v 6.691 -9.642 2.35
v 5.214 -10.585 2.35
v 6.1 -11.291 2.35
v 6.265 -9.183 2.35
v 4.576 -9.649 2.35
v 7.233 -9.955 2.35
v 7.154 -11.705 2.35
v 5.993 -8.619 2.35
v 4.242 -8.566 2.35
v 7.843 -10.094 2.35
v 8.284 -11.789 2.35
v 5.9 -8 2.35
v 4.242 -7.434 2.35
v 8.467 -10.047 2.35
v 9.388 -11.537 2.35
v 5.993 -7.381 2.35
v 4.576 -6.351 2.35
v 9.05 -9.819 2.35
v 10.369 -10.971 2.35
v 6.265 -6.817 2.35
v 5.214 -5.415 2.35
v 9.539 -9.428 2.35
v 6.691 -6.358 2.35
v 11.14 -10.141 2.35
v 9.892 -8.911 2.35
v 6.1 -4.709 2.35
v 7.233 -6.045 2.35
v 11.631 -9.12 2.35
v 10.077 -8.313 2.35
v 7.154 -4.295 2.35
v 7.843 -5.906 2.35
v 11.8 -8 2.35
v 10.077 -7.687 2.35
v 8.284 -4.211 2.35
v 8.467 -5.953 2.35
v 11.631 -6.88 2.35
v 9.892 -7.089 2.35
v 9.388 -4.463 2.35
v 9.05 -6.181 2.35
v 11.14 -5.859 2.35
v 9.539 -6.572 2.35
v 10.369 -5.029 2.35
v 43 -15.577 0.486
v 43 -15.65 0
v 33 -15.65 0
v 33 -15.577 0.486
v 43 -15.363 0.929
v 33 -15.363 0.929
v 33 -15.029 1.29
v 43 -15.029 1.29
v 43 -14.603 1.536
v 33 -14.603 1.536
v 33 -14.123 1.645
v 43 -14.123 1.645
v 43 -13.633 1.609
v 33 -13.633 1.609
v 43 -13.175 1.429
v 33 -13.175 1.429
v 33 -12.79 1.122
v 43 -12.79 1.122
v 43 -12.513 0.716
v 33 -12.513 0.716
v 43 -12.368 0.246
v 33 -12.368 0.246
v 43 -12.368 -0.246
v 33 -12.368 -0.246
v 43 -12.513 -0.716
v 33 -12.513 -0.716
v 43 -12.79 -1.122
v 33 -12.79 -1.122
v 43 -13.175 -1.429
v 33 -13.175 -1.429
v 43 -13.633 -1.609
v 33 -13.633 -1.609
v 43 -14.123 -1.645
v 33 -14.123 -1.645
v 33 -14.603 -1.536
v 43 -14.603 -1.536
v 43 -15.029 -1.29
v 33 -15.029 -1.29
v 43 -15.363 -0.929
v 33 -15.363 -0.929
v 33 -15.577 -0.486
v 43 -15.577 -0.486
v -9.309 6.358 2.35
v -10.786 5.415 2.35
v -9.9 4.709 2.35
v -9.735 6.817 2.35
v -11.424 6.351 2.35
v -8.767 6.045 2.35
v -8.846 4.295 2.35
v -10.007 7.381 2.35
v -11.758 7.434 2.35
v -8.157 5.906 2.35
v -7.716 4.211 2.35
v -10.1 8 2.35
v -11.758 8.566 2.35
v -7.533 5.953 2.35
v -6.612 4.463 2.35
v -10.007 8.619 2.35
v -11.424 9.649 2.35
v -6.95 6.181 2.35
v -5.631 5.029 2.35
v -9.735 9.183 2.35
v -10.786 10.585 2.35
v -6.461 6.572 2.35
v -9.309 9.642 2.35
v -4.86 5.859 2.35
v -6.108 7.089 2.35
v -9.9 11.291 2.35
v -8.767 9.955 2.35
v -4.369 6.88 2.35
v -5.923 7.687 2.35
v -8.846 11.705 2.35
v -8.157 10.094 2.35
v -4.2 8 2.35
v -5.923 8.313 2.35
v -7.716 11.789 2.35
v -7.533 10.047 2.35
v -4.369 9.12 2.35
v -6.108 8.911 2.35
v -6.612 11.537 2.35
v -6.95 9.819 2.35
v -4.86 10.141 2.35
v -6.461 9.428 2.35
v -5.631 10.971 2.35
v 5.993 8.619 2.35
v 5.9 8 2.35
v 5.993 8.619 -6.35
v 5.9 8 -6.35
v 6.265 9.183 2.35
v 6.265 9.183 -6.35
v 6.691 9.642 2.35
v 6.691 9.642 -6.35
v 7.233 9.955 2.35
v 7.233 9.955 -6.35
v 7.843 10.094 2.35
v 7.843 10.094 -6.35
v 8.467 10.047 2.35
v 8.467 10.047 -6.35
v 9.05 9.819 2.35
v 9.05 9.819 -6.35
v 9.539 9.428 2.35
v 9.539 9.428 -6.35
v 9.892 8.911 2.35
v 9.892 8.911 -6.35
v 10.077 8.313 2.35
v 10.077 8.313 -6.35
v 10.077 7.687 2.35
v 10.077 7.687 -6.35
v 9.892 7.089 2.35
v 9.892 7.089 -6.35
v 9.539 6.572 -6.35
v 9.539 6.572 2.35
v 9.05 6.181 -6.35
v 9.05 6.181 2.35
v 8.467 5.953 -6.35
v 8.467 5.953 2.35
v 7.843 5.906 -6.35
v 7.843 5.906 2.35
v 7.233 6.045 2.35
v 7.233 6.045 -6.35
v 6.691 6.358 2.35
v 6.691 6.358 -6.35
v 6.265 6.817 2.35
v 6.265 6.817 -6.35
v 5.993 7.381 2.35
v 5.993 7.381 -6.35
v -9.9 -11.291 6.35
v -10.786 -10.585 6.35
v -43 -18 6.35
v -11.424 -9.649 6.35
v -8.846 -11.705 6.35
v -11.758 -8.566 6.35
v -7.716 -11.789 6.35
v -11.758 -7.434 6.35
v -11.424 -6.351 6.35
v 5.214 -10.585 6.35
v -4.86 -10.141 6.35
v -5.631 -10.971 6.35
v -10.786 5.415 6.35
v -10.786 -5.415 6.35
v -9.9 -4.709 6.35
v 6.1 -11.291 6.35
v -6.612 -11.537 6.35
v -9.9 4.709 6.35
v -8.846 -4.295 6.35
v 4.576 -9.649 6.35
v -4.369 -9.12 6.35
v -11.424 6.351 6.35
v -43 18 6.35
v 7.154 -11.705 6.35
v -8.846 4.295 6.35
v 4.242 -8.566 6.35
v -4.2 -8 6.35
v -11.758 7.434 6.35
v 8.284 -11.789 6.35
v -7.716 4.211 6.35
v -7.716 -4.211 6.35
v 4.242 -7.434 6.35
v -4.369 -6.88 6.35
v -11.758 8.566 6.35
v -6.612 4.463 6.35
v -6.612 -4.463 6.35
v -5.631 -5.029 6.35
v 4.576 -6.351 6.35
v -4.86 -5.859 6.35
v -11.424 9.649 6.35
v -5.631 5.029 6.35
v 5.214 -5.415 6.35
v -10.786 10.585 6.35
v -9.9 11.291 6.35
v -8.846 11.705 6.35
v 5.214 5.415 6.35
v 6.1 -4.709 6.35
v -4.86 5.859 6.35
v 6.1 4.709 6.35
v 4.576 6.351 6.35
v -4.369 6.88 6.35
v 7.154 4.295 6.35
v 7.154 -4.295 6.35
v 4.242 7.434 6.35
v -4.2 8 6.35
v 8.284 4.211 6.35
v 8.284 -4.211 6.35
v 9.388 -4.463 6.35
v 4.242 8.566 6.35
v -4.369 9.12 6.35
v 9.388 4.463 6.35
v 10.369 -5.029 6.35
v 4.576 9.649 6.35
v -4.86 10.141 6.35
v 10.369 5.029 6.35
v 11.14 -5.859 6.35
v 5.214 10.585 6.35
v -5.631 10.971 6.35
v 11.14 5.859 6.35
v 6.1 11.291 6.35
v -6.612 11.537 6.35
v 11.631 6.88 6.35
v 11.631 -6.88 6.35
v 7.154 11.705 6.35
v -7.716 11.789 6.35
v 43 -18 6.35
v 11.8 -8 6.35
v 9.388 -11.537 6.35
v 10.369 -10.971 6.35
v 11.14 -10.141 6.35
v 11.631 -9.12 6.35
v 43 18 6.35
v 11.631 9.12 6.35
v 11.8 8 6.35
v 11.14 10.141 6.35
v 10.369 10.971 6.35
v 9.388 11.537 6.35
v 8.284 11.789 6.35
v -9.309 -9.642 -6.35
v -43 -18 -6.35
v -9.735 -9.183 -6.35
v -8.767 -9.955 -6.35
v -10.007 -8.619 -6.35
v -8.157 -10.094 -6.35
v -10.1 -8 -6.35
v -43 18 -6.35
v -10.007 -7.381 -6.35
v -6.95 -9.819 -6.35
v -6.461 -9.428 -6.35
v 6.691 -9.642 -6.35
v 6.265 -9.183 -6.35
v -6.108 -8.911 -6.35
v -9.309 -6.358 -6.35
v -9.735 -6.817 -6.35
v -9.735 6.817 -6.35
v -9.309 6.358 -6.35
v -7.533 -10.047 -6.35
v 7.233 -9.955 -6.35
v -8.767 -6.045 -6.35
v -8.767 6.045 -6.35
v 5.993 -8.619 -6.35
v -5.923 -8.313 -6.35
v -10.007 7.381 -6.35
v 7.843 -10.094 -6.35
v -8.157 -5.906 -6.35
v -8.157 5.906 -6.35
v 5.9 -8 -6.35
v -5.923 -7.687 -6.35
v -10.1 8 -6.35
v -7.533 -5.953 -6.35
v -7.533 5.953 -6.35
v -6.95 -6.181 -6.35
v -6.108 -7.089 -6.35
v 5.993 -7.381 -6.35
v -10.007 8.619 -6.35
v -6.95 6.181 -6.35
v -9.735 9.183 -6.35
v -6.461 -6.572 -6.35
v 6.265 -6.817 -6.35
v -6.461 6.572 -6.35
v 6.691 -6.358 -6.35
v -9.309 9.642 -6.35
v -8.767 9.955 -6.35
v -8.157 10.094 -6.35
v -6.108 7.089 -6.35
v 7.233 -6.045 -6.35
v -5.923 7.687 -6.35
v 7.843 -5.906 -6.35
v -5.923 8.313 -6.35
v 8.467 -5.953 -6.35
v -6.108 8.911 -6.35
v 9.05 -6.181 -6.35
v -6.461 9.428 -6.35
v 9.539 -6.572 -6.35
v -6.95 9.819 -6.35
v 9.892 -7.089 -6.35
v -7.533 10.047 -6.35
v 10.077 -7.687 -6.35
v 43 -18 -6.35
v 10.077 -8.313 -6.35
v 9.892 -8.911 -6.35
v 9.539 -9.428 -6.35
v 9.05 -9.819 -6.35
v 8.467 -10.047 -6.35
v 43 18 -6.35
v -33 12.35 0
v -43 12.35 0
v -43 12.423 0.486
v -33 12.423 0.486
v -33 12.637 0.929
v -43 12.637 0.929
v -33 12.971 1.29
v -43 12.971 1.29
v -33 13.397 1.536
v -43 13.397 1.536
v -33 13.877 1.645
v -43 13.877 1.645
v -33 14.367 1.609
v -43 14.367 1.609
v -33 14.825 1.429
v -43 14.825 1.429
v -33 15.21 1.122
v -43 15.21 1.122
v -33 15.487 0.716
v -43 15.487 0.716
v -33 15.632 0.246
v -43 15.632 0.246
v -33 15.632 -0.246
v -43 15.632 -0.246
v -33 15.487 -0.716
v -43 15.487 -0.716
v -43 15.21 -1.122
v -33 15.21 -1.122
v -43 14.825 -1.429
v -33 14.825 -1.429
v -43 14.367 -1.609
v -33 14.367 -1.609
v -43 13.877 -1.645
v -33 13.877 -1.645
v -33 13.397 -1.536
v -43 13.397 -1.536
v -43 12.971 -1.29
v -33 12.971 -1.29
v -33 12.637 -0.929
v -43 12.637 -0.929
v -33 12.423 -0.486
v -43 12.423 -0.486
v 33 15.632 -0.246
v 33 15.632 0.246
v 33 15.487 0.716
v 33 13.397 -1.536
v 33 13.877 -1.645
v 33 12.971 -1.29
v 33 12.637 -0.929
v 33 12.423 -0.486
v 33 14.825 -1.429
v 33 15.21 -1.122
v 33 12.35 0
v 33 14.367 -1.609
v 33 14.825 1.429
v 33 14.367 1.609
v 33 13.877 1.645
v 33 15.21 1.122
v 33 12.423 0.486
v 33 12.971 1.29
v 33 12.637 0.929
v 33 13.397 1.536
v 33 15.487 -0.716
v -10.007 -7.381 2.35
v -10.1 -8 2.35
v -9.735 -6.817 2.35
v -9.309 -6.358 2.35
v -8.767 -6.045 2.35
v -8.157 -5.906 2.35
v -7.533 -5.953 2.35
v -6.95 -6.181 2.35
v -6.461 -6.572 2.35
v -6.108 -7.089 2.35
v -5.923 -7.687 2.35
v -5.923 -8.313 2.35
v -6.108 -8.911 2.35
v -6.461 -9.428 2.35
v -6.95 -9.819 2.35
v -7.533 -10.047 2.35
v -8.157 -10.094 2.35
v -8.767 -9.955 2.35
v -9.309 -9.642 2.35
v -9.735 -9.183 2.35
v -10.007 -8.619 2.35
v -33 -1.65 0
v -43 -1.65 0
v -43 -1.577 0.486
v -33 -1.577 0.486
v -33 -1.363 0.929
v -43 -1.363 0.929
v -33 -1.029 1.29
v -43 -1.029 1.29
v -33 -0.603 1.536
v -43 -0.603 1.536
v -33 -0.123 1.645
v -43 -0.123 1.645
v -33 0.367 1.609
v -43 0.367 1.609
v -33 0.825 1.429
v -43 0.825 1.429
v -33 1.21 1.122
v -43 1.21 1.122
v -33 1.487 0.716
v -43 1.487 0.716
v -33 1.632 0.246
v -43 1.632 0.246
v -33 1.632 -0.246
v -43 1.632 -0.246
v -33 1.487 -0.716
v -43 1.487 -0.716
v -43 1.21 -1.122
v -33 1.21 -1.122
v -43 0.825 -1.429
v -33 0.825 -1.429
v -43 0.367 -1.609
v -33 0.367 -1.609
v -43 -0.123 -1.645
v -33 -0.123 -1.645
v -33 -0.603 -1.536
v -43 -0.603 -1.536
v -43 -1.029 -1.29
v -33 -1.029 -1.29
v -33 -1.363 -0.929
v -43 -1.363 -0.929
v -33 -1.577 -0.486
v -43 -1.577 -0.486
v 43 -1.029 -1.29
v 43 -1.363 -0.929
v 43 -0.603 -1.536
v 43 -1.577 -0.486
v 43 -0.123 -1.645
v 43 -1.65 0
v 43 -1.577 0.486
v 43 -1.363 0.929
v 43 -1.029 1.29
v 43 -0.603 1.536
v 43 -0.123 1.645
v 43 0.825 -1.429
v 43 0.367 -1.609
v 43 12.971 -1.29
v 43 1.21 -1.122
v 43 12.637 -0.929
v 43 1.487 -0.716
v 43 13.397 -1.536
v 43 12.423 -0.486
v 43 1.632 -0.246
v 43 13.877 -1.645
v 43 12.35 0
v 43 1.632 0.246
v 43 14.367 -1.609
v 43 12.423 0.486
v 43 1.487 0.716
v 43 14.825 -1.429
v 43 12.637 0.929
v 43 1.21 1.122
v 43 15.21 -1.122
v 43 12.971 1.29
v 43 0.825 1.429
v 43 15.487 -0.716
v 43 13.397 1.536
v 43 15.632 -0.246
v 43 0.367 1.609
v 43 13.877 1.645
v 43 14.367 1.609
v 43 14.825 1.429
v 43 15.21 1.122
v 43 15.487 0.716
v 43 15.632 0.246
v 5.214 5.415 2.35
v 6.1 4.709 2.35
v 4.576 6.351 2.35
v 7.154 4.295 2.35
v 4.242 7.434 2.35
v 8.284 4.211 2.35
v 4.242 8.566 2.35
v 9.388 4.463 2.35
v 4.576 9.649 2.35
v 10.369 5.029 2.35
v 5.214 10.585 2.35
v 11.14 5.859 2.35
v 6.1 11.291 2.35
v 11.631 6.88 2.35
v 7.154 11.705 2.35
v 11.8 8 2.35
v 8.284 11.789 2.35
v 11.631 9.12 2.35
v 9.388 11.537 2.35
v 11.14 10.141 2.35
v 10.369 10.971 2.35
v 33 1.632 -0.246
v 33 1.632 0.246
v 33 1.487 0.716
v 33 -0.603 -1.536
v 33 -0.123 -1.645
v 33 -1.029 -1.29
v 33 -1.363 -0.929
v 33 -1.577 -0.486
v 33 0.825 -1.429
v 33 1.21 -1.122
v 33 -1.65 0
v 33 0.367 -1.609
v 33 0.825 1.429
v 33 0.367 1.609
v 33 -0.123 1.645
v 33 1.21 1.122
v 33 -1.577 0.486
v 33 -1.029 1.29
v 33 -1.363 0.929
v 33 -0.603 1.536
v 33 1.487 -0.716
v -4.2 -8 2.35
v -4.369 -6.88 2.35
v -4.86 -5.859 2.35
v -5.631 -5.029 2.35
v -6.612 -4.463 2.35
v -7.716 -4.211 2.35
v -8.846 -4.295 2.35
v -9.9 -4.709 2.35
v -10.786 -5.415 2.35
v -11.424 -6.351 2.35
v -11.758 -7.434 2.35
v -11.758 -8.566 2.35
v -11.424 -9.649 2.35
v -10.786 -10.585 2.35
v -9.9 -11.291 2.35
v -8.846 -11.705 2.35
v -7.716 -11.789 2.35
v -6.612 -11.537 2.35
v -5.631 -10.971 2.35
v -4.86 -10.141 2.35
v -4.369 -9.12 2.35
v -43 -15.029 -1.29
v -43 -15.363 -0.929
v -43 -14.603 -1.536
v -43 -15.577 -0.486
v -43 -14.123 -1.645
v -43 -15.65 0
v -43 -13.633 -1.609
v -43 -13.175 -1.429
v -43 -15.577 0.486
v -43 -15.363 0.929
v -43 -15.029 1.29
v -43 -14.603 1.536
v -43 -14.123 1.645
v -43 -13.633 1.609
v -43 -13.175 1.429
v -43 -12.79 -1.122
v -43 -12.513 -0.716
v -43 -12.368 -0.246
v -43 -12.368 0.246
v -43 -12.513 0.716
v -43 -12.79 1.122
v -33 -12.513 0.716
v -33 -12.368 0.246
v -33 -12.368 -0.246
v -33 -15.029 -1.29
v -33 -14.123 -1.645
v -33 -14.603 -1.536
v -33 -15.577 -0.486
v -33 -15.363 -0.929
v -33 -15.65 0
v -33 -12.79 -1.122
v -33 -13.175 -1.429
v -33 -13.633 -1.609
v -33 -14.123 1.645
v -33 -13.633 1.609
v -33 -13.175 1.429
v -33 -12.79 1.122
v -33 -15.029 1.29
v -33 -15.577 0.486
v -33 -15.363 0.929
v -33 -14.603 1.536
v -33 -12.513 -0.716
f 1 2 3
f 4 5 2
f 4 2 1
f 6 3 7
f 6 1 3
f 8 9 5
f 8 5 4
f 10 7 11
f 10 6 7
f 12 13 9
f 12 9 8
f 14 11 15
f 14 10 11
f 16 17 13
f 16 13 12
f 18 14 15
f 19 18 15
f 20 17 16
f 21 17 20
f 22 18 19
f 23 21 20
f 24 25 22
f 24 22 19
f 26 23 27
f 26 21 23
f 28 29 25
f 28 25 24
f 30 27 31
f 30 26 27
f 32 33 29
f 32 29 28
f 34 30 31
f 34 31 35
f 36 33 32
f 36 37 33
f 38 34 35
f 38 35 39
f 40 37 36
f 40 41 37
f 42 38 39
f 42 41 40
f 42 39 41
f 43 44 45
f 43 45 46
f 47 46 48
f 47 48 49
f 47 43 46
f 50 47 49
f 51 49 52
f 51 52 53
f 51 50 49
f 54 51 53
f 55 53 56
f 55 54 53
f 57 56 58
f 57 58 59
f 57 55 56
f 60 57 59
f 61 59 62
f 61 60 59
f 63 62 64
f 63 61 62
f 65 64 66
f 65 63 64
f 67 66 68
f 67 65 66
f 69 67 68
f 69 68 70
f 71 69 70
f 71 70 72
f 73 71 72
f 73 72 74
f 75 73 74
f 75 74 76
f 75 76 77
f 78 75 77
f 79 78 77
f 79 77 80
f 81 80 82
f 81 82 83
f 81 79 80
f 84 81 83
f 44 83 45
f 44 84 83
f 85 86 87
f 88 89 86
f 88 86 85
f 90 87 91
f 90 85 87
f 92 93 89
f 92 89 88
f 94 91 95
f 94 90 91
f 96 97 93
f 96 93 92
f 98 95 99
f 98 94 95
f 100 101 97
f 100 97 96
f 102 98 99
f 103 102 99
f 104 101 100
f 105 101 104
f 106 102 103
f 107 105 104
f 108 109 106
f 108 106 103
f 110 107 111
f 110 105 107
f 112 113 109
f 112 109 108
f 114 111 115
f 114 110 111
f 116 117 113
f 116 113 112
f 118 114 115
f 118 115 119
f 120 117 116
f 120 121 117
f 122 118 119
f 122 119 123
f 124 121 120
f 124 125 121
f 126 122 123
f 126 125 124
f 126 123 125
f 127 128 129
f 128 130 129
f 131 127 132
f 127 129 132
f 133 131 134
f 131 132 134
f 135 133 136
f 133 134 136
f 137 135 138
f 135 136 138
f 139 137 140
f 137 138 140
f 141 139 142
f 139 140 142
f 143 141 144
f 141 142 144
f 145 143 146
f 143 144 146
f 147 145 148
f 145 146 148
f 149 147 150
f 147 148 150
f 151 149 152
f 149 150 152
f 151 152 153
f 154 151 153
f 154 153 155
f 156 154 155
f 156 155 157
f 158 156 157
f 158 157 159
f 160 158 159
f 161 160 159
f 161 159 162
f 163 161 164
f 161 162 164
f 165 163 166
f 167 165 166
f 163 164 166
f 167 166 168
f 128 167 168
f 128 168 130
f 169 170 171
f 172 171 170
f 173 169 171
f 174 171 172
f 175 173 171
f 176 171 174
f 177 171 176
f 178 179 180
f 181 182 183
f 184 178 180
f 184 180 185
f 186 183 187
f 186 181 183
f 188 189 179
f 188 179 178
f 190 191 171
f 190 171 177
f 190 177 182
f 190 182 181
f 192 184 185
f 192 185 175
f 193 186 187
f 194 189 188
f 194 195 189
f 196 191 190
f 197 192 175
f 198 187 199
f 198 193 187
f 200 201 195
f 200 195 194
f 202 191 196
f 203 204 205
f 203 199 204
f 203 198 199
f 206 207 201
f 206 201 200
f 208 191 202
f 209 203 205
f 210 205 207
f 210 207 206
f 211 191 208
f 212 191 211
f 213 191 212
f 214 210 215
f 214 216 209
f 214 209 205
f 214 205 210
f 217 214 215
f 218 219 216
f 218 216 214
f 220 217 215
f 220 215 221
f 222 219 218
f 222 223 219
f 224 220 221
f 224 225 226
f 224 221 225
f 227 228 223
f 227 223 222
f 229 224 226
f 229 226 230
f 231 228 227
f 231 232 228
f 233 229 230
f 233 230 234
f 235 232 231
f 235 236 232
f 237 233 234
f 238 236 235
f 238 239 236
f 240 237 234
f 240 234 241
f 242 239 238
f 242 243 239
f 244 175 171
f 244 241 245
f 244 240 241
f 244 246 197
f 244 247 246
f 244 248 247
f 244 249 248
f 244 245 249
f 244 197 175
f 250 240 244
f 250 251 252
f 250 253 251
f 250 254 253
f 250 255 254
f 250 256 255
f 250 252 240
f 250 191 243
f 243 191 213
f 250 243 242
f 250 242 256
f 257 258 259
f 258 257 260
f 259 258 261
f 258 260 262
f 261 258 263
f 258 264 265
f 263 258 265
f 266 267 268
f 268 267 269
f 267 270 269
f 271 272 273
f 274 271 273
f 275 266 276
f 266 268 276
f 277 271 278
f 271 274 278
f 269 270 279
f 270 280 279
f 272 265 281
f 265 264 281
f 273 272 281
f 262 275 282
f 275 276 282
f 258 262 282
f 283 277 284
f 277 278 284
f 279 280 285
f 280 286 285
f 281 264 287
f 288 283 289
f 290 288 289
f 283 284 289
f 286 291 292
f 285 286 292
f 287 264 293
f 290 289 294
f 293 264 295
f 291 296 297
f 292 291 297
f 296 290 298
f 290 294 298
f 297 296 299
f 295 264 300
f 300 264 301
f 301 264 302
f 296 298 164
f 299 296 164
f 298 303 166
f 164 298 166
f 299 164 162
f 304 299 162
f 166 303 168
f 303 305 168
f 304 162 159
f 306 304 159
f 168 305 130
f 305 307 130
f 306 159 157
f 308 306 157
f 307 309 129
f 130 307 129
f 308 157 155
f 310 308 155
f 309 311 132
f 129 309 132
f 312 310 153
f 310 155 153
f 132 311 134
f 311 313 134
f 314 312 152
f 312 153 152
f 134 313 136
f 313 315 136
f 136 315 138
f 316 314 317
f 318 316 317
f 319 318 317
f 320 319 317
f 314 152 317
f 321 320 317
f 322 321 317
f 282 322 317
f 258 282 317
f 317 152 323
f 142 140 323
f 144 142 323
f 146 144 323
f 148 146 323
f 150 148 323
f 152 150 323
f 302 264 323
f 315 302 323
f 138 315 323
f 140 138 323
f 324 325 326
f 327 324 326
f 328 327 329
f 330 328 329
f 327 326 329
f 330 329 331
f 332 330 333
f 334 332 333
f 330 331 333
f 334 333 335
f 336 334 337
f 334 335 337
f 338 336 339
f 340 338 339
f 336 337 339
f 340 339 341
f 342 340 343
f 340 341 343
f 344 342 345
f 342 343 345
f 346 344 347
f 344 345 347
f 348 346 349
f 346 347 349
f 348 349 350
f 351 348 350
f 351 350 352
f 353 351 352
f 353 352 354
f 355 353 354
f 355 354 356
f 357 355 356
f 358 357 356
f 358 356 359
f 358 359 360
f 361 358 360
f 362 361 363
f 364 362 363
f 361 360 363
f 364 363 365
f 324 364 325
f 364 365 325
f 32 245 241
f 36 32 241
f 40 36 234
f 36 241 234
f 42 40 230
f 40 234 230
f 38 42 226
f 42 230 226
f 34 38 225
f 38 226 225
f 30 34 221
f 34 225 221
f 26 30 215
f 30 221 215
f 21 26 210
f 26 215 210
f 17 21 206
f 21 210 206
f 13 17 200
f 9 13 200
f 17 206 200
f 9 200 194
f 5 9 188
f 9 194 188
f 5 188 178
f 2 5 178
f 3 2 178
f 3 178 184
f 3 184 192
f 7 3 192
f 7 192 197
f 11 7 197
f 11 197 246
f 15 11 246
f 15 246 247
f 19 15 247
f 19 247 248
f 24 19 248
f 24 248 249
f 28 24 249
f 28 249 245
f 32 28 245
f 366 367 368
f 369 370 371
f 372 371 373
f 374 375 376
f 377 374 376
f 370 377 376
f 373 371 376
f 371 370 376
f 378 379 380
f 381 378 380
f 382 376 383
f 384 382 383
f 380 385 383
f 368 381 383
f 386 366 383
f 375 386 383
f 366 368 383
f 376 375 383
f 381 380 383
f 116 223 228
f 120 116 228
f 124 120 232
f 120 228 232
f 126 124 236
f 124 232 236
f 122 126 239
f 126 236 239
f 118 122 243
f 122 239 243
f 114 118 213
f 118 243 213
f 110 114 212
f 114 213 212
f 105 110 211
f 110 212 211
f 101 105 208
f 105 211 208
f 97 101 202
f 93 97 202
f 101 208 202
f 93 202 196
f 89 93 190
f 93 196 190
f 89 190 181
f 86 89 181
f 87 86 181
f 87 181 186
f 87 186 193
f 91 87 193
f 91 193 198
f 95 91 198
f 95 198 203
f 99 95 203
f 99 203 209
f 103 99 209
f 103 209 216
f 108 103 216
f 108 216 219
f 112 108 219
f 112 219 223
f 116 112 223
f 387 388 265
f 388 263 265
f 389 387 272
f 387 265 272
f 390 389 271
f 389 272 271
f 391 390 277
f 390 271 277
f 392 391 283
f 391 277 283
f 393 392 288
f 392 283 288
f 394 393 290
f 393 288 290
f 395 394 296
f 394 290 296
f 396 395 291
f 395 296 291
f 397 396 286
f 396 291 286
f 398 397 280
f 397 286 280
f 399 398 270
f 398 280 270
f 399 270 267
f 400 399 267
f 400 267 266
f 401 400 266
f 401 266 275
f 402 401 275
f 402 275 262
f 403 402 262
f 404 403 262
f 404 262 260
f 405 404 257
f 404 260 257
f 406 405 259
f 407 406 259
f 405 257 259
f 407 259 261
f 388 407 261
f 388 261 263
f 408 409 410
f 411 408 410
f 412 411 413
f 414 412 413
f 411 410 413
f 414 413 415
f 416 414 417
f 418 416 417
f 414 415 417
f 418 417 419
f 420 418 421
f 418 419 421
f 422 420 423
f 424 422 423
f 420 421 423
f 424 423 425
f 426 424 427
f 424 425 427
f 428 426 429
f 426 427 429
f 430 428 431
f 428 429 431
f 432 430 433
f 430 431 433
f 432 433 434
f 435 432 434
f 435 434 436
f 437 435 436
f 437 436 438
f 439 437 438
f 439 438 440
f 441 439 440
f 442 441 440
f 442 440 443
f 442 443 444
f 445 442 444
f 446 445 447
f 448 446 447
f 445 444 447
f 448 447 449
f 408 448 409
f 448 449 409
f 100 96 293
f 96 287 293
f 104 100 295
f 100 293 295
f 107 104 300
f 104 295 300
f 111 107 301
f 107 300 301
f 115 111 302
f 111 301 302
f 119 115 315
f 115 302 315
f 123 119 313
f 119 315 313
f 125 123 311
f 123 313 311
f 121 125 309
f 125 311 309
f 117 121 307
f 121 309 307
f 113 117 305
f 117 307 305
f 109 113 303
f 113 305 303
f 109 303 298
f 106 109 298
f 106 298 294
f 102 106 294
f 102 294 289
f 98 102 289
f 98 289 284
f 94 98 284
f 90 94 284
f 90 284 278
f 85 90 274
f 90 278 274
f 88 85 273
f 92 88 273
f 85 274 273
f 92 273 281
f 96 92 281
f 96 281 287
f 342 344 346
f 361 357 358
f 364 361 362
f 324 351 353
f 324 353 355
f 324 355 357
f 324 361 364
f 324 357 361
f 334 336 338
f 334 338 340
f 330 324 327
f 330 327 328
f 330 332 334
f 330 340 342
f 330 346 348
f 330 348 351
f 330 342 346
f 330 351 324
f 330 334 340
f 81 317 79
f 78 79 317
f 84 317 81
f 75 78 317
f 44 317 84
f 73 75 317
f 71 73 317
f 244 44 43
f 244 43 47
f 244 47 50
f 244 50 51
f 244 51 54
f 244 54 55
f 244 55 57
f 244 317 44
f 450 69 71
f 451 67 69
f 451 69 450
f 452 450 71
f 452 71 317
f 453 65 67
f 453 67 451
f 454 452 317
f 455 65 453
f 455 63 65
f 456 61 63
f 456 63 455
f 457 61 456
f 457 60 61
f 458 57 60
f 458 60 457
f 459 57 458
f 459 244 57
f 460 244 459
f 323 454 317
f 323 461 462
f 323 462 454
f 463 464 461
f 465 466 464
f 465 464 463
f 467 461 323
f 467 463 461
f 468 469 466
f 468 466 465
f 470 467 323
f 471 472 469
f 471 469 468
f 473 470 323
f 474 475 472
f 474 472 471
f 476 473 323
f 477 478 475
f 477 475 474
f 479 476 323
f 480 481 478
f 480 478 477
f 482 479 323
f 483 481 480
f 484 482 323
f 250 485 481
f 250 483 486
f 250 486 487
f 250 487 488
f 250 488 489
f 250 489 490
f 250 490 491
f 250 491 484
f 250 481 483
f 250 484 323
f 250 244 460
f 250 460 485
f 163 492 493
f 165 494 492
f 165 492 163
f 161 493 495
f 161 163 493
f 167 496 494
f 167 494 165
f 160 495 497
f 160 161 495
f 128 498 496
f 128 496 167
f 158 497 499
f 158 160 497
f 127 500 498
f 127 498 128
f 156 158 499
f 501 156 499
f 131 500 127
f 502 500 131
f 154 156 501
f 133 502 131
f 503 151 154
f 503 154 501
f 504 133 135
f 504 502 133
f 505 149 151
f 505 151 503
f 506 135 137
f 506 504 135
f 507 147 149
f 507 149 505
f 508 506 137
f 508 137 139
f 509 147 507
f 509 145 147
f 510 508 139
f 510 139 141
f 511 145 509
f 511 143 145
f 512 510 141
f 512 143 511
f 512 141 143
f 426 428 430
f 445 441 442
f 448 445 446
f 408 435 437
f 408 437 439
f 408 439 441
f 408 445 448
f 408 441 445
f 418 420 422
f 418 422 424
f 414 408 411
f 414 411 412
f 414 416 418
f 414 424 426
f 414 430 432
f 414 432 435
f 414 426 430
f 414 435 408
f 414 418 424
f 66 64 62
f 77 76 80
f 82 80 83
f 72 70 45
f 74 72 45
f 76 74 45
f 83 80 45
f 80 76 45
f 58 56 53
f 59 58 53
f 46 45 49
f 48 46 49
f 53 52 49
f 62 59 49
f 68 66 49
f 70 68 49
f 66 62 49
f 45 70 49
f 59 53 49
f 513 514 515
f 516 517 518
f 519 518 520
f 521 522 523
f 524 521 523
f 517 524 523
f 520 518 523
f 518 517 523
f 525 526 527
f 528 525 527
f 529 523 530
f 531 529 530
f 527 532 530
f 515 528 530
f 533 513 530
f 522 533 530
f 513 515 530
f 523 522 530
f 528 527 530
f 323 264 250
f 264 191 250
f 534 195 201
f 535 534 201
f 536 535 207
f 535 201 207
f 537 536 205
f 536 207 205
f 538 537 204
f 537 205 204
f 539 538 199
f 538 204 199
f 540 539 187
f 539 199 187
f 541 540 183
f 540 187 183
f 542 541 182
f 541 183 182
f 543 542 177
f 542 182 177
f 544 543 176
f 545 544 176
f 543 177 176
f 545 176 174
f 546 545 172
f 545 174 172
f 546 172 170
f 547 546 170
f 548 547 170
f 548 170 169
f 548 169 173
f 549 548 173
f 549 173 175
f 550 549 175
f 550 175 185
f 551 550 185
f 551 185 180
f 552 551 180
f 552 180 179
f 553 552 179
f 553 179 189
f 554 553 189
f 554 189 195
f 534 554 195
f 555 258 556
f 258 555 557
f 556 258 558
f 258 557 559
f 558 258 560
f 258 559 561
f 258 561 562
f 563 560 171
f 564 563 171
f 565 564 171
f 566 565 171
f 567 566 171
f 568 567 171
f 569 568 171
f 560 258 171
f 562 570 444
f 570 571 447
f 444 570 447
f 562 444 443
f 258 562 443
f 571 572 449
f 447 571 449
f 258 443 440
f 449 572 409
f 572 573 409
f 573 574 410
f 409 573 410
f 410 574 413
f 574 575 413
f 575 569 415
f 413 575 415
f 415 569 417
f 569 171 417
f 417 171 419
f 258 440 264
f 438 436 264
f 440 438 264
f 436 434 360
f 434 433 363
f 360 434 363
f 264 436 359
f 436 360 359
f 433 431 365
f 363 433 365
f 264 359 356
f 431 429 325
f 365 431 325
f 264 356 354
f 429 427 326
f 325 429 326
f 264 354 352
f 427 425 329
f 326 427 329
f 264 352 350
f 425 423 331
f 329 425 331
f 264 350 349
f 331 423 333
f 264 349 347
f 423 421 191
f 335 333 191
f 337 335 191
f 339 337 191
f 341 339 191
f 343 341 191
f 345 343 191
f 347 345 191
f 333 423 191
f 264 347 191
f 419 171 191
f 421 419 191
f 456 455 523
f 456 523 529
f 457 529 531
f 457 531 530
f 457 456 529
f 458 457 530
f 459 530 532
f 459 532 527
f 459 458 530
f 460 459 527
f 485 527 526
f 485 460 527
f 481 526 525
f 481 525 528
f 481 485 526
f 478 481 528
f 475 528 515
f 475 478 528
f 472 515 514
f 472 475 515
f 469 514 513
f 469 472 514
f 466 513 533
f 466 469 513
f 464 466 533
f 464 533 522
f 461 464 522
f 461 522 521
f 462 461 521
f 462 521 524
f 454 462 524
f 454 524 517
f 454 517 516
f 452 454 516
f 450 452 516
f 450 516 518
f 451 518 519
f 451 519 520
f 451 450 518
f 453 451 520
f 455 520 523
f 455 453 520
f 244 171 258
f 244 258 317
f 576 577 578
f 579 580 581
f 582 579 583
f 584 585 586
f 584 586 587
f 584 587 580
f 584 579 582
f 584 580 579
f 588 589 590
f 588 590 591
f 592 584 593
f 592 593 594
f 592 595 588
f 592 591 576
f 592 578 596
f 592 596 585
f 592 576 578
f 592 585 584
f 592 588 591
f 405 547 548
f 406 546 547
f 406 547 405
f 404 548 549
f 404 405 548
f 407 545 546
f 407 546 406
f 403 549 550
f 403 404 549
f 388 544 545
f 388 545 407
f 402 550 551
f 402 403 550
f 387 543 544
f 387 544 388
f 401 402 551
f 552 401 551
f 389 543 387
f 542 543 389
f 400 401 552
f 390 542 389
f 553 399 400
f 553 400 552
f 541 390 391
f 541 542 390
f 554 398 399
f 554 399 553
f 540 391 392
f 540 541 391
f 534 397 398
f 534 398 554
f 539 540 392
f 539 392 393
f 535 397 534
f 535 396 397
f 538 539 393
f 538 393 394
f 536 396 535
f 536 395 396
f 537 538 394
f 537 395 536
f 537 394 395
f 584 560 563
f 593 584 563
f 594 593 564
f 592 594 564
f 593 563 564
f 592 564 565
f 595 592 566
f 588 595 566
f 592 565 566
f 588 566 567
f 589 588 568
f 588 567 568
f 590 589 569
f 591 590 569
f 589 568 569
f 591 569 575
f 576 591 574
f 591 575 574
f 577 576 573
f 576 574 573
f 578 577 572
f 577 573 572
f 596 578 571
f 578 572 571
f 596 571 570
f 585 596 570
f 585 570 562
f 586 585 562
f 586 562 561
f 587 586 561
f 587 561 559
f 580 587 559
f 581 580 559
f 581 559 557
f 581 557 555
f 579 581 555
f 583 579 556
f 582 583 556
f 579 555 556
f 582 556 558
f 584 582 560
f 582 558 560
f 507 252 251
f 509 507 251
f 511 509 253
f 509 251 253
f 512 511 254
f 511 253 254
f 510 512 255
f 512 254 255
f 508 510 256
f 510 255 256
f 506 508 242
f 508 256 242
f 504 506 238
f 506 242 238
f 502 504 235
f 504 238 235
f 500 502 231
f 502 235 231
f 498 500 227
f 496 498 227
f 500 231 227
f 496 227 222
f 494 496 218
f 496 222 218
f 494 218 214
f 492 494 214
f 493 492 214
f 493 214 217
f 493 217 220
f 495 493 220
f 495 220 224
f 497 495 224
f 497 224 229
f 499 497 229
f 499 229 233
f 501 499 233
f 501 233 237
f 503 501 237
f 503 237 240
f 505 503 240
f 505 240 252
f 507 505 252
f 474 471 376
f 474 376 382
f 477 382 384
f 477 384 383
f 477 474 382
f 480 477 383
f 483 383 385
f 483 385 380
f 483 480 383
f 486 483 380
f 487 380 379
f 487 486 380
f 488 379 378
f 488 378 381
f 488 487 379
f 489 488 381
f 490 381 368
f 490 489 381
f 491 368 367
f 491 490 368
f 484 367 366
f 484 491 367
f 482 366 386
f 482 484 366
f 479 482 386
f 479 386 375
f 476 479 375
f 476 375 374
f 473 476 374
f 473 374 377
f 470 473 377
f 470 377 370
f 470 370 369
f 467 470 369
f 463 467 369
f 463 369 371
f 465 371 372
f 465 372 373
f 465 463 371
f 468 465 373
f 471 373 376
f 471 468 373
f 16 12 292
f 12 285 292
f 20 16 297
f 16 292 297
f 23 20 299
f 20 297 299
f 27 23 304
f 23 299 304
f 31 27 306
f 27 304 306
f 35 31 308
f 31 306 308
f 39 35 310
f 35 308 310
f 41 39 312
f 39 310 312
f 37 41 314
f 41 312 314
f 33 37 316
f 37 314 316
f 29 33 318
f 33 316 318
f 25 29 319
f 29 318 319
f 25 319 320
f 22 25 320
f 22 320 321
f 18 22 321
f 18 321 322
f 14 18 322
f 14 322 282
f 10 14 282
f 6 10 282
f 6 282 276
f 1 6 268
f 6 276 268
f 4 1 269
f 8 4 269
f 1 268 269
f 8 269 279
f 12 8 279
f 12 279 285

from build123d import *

# Parameters (mm, degrees)
SKETCH1_W                                    = 86
SKETCH1_H                                    = 36
BOSS_EXTRUDE1_DEPTH                          = 6.35
CBORE_FOR_M4_HEX_HEAD_CAP_SCREW2_D           = 4.2
CBORE_FOR_M4_HEX_HEAD_CAP_SCREW2_CBORE_D     = 7.6
CBORE_FOR_M4_HEX_HEAD_CAP_SCREW2_CBORE_DEPTH = 4
SKETCH6_R                                    = 1.65
CUT_EXTRUDE1_DEPTH                           = 10


with BuildPart() as part:
    # Sketch1 → Boss-Extrude1 (new, symmetric)
    with BuildSketch(Plane.XY):
        Rectangle(SKETCH1_W, SKETCH1_H)
    extrude(amount=BOSS_EXTRUDE1_DEPTH, both=True)

    # CBORE for M4 Hex Head Cap Screw2 (through all)
    with Locations(Plane(origin=(-8, 8, 6.35), x_dir=(1, 0, 0), z_dir=(0, 0, 1))):
        with Locations((0, 0), (0, -16), (16, -16), (16, 0)):
            CounterBoreHole(CBORE_FOR_M4_HEX_HEAD_CAP_SCREW2_D / 2, CBORE_FOR_M4_HEX_HEAD_CAP_SCREW2_CBORE_D / 2, CBORE_FOR_M4_HEX_HEAD_CAP_SCREW2_CBORE_DEPTH)

    # Sketch6 → Cut-Extrude1 (cut)
    with BuildSketch(Plane.ZY.offset(43)):
        with Locations(Location((0, 14, 0), (0, 0, 270))):
            Circle(SKETCH6_R)
        with Locations(Location((0, -14, 0), (0, 0, 270))):
            Circle(SKETCH6_R)
        with Locations(Location((0, 0, 0), (0, 0, 270))):
            Circle(SKETCH6_R)
    cut_extrude1 = extrude(amount=-CUT_EXTRUDE1_DEPTH, mode=Mode.SUBTRACT)

    # Mirror1: Cut-Extrude1 across plane
    add(cut_extrude1.mirror(Plane(origin=(0, 0, 0), x_dir=(0, 0, 1), z_dir=(1, 0, 0))), mode=Mode.SUBTRACT)


solid = part.part
